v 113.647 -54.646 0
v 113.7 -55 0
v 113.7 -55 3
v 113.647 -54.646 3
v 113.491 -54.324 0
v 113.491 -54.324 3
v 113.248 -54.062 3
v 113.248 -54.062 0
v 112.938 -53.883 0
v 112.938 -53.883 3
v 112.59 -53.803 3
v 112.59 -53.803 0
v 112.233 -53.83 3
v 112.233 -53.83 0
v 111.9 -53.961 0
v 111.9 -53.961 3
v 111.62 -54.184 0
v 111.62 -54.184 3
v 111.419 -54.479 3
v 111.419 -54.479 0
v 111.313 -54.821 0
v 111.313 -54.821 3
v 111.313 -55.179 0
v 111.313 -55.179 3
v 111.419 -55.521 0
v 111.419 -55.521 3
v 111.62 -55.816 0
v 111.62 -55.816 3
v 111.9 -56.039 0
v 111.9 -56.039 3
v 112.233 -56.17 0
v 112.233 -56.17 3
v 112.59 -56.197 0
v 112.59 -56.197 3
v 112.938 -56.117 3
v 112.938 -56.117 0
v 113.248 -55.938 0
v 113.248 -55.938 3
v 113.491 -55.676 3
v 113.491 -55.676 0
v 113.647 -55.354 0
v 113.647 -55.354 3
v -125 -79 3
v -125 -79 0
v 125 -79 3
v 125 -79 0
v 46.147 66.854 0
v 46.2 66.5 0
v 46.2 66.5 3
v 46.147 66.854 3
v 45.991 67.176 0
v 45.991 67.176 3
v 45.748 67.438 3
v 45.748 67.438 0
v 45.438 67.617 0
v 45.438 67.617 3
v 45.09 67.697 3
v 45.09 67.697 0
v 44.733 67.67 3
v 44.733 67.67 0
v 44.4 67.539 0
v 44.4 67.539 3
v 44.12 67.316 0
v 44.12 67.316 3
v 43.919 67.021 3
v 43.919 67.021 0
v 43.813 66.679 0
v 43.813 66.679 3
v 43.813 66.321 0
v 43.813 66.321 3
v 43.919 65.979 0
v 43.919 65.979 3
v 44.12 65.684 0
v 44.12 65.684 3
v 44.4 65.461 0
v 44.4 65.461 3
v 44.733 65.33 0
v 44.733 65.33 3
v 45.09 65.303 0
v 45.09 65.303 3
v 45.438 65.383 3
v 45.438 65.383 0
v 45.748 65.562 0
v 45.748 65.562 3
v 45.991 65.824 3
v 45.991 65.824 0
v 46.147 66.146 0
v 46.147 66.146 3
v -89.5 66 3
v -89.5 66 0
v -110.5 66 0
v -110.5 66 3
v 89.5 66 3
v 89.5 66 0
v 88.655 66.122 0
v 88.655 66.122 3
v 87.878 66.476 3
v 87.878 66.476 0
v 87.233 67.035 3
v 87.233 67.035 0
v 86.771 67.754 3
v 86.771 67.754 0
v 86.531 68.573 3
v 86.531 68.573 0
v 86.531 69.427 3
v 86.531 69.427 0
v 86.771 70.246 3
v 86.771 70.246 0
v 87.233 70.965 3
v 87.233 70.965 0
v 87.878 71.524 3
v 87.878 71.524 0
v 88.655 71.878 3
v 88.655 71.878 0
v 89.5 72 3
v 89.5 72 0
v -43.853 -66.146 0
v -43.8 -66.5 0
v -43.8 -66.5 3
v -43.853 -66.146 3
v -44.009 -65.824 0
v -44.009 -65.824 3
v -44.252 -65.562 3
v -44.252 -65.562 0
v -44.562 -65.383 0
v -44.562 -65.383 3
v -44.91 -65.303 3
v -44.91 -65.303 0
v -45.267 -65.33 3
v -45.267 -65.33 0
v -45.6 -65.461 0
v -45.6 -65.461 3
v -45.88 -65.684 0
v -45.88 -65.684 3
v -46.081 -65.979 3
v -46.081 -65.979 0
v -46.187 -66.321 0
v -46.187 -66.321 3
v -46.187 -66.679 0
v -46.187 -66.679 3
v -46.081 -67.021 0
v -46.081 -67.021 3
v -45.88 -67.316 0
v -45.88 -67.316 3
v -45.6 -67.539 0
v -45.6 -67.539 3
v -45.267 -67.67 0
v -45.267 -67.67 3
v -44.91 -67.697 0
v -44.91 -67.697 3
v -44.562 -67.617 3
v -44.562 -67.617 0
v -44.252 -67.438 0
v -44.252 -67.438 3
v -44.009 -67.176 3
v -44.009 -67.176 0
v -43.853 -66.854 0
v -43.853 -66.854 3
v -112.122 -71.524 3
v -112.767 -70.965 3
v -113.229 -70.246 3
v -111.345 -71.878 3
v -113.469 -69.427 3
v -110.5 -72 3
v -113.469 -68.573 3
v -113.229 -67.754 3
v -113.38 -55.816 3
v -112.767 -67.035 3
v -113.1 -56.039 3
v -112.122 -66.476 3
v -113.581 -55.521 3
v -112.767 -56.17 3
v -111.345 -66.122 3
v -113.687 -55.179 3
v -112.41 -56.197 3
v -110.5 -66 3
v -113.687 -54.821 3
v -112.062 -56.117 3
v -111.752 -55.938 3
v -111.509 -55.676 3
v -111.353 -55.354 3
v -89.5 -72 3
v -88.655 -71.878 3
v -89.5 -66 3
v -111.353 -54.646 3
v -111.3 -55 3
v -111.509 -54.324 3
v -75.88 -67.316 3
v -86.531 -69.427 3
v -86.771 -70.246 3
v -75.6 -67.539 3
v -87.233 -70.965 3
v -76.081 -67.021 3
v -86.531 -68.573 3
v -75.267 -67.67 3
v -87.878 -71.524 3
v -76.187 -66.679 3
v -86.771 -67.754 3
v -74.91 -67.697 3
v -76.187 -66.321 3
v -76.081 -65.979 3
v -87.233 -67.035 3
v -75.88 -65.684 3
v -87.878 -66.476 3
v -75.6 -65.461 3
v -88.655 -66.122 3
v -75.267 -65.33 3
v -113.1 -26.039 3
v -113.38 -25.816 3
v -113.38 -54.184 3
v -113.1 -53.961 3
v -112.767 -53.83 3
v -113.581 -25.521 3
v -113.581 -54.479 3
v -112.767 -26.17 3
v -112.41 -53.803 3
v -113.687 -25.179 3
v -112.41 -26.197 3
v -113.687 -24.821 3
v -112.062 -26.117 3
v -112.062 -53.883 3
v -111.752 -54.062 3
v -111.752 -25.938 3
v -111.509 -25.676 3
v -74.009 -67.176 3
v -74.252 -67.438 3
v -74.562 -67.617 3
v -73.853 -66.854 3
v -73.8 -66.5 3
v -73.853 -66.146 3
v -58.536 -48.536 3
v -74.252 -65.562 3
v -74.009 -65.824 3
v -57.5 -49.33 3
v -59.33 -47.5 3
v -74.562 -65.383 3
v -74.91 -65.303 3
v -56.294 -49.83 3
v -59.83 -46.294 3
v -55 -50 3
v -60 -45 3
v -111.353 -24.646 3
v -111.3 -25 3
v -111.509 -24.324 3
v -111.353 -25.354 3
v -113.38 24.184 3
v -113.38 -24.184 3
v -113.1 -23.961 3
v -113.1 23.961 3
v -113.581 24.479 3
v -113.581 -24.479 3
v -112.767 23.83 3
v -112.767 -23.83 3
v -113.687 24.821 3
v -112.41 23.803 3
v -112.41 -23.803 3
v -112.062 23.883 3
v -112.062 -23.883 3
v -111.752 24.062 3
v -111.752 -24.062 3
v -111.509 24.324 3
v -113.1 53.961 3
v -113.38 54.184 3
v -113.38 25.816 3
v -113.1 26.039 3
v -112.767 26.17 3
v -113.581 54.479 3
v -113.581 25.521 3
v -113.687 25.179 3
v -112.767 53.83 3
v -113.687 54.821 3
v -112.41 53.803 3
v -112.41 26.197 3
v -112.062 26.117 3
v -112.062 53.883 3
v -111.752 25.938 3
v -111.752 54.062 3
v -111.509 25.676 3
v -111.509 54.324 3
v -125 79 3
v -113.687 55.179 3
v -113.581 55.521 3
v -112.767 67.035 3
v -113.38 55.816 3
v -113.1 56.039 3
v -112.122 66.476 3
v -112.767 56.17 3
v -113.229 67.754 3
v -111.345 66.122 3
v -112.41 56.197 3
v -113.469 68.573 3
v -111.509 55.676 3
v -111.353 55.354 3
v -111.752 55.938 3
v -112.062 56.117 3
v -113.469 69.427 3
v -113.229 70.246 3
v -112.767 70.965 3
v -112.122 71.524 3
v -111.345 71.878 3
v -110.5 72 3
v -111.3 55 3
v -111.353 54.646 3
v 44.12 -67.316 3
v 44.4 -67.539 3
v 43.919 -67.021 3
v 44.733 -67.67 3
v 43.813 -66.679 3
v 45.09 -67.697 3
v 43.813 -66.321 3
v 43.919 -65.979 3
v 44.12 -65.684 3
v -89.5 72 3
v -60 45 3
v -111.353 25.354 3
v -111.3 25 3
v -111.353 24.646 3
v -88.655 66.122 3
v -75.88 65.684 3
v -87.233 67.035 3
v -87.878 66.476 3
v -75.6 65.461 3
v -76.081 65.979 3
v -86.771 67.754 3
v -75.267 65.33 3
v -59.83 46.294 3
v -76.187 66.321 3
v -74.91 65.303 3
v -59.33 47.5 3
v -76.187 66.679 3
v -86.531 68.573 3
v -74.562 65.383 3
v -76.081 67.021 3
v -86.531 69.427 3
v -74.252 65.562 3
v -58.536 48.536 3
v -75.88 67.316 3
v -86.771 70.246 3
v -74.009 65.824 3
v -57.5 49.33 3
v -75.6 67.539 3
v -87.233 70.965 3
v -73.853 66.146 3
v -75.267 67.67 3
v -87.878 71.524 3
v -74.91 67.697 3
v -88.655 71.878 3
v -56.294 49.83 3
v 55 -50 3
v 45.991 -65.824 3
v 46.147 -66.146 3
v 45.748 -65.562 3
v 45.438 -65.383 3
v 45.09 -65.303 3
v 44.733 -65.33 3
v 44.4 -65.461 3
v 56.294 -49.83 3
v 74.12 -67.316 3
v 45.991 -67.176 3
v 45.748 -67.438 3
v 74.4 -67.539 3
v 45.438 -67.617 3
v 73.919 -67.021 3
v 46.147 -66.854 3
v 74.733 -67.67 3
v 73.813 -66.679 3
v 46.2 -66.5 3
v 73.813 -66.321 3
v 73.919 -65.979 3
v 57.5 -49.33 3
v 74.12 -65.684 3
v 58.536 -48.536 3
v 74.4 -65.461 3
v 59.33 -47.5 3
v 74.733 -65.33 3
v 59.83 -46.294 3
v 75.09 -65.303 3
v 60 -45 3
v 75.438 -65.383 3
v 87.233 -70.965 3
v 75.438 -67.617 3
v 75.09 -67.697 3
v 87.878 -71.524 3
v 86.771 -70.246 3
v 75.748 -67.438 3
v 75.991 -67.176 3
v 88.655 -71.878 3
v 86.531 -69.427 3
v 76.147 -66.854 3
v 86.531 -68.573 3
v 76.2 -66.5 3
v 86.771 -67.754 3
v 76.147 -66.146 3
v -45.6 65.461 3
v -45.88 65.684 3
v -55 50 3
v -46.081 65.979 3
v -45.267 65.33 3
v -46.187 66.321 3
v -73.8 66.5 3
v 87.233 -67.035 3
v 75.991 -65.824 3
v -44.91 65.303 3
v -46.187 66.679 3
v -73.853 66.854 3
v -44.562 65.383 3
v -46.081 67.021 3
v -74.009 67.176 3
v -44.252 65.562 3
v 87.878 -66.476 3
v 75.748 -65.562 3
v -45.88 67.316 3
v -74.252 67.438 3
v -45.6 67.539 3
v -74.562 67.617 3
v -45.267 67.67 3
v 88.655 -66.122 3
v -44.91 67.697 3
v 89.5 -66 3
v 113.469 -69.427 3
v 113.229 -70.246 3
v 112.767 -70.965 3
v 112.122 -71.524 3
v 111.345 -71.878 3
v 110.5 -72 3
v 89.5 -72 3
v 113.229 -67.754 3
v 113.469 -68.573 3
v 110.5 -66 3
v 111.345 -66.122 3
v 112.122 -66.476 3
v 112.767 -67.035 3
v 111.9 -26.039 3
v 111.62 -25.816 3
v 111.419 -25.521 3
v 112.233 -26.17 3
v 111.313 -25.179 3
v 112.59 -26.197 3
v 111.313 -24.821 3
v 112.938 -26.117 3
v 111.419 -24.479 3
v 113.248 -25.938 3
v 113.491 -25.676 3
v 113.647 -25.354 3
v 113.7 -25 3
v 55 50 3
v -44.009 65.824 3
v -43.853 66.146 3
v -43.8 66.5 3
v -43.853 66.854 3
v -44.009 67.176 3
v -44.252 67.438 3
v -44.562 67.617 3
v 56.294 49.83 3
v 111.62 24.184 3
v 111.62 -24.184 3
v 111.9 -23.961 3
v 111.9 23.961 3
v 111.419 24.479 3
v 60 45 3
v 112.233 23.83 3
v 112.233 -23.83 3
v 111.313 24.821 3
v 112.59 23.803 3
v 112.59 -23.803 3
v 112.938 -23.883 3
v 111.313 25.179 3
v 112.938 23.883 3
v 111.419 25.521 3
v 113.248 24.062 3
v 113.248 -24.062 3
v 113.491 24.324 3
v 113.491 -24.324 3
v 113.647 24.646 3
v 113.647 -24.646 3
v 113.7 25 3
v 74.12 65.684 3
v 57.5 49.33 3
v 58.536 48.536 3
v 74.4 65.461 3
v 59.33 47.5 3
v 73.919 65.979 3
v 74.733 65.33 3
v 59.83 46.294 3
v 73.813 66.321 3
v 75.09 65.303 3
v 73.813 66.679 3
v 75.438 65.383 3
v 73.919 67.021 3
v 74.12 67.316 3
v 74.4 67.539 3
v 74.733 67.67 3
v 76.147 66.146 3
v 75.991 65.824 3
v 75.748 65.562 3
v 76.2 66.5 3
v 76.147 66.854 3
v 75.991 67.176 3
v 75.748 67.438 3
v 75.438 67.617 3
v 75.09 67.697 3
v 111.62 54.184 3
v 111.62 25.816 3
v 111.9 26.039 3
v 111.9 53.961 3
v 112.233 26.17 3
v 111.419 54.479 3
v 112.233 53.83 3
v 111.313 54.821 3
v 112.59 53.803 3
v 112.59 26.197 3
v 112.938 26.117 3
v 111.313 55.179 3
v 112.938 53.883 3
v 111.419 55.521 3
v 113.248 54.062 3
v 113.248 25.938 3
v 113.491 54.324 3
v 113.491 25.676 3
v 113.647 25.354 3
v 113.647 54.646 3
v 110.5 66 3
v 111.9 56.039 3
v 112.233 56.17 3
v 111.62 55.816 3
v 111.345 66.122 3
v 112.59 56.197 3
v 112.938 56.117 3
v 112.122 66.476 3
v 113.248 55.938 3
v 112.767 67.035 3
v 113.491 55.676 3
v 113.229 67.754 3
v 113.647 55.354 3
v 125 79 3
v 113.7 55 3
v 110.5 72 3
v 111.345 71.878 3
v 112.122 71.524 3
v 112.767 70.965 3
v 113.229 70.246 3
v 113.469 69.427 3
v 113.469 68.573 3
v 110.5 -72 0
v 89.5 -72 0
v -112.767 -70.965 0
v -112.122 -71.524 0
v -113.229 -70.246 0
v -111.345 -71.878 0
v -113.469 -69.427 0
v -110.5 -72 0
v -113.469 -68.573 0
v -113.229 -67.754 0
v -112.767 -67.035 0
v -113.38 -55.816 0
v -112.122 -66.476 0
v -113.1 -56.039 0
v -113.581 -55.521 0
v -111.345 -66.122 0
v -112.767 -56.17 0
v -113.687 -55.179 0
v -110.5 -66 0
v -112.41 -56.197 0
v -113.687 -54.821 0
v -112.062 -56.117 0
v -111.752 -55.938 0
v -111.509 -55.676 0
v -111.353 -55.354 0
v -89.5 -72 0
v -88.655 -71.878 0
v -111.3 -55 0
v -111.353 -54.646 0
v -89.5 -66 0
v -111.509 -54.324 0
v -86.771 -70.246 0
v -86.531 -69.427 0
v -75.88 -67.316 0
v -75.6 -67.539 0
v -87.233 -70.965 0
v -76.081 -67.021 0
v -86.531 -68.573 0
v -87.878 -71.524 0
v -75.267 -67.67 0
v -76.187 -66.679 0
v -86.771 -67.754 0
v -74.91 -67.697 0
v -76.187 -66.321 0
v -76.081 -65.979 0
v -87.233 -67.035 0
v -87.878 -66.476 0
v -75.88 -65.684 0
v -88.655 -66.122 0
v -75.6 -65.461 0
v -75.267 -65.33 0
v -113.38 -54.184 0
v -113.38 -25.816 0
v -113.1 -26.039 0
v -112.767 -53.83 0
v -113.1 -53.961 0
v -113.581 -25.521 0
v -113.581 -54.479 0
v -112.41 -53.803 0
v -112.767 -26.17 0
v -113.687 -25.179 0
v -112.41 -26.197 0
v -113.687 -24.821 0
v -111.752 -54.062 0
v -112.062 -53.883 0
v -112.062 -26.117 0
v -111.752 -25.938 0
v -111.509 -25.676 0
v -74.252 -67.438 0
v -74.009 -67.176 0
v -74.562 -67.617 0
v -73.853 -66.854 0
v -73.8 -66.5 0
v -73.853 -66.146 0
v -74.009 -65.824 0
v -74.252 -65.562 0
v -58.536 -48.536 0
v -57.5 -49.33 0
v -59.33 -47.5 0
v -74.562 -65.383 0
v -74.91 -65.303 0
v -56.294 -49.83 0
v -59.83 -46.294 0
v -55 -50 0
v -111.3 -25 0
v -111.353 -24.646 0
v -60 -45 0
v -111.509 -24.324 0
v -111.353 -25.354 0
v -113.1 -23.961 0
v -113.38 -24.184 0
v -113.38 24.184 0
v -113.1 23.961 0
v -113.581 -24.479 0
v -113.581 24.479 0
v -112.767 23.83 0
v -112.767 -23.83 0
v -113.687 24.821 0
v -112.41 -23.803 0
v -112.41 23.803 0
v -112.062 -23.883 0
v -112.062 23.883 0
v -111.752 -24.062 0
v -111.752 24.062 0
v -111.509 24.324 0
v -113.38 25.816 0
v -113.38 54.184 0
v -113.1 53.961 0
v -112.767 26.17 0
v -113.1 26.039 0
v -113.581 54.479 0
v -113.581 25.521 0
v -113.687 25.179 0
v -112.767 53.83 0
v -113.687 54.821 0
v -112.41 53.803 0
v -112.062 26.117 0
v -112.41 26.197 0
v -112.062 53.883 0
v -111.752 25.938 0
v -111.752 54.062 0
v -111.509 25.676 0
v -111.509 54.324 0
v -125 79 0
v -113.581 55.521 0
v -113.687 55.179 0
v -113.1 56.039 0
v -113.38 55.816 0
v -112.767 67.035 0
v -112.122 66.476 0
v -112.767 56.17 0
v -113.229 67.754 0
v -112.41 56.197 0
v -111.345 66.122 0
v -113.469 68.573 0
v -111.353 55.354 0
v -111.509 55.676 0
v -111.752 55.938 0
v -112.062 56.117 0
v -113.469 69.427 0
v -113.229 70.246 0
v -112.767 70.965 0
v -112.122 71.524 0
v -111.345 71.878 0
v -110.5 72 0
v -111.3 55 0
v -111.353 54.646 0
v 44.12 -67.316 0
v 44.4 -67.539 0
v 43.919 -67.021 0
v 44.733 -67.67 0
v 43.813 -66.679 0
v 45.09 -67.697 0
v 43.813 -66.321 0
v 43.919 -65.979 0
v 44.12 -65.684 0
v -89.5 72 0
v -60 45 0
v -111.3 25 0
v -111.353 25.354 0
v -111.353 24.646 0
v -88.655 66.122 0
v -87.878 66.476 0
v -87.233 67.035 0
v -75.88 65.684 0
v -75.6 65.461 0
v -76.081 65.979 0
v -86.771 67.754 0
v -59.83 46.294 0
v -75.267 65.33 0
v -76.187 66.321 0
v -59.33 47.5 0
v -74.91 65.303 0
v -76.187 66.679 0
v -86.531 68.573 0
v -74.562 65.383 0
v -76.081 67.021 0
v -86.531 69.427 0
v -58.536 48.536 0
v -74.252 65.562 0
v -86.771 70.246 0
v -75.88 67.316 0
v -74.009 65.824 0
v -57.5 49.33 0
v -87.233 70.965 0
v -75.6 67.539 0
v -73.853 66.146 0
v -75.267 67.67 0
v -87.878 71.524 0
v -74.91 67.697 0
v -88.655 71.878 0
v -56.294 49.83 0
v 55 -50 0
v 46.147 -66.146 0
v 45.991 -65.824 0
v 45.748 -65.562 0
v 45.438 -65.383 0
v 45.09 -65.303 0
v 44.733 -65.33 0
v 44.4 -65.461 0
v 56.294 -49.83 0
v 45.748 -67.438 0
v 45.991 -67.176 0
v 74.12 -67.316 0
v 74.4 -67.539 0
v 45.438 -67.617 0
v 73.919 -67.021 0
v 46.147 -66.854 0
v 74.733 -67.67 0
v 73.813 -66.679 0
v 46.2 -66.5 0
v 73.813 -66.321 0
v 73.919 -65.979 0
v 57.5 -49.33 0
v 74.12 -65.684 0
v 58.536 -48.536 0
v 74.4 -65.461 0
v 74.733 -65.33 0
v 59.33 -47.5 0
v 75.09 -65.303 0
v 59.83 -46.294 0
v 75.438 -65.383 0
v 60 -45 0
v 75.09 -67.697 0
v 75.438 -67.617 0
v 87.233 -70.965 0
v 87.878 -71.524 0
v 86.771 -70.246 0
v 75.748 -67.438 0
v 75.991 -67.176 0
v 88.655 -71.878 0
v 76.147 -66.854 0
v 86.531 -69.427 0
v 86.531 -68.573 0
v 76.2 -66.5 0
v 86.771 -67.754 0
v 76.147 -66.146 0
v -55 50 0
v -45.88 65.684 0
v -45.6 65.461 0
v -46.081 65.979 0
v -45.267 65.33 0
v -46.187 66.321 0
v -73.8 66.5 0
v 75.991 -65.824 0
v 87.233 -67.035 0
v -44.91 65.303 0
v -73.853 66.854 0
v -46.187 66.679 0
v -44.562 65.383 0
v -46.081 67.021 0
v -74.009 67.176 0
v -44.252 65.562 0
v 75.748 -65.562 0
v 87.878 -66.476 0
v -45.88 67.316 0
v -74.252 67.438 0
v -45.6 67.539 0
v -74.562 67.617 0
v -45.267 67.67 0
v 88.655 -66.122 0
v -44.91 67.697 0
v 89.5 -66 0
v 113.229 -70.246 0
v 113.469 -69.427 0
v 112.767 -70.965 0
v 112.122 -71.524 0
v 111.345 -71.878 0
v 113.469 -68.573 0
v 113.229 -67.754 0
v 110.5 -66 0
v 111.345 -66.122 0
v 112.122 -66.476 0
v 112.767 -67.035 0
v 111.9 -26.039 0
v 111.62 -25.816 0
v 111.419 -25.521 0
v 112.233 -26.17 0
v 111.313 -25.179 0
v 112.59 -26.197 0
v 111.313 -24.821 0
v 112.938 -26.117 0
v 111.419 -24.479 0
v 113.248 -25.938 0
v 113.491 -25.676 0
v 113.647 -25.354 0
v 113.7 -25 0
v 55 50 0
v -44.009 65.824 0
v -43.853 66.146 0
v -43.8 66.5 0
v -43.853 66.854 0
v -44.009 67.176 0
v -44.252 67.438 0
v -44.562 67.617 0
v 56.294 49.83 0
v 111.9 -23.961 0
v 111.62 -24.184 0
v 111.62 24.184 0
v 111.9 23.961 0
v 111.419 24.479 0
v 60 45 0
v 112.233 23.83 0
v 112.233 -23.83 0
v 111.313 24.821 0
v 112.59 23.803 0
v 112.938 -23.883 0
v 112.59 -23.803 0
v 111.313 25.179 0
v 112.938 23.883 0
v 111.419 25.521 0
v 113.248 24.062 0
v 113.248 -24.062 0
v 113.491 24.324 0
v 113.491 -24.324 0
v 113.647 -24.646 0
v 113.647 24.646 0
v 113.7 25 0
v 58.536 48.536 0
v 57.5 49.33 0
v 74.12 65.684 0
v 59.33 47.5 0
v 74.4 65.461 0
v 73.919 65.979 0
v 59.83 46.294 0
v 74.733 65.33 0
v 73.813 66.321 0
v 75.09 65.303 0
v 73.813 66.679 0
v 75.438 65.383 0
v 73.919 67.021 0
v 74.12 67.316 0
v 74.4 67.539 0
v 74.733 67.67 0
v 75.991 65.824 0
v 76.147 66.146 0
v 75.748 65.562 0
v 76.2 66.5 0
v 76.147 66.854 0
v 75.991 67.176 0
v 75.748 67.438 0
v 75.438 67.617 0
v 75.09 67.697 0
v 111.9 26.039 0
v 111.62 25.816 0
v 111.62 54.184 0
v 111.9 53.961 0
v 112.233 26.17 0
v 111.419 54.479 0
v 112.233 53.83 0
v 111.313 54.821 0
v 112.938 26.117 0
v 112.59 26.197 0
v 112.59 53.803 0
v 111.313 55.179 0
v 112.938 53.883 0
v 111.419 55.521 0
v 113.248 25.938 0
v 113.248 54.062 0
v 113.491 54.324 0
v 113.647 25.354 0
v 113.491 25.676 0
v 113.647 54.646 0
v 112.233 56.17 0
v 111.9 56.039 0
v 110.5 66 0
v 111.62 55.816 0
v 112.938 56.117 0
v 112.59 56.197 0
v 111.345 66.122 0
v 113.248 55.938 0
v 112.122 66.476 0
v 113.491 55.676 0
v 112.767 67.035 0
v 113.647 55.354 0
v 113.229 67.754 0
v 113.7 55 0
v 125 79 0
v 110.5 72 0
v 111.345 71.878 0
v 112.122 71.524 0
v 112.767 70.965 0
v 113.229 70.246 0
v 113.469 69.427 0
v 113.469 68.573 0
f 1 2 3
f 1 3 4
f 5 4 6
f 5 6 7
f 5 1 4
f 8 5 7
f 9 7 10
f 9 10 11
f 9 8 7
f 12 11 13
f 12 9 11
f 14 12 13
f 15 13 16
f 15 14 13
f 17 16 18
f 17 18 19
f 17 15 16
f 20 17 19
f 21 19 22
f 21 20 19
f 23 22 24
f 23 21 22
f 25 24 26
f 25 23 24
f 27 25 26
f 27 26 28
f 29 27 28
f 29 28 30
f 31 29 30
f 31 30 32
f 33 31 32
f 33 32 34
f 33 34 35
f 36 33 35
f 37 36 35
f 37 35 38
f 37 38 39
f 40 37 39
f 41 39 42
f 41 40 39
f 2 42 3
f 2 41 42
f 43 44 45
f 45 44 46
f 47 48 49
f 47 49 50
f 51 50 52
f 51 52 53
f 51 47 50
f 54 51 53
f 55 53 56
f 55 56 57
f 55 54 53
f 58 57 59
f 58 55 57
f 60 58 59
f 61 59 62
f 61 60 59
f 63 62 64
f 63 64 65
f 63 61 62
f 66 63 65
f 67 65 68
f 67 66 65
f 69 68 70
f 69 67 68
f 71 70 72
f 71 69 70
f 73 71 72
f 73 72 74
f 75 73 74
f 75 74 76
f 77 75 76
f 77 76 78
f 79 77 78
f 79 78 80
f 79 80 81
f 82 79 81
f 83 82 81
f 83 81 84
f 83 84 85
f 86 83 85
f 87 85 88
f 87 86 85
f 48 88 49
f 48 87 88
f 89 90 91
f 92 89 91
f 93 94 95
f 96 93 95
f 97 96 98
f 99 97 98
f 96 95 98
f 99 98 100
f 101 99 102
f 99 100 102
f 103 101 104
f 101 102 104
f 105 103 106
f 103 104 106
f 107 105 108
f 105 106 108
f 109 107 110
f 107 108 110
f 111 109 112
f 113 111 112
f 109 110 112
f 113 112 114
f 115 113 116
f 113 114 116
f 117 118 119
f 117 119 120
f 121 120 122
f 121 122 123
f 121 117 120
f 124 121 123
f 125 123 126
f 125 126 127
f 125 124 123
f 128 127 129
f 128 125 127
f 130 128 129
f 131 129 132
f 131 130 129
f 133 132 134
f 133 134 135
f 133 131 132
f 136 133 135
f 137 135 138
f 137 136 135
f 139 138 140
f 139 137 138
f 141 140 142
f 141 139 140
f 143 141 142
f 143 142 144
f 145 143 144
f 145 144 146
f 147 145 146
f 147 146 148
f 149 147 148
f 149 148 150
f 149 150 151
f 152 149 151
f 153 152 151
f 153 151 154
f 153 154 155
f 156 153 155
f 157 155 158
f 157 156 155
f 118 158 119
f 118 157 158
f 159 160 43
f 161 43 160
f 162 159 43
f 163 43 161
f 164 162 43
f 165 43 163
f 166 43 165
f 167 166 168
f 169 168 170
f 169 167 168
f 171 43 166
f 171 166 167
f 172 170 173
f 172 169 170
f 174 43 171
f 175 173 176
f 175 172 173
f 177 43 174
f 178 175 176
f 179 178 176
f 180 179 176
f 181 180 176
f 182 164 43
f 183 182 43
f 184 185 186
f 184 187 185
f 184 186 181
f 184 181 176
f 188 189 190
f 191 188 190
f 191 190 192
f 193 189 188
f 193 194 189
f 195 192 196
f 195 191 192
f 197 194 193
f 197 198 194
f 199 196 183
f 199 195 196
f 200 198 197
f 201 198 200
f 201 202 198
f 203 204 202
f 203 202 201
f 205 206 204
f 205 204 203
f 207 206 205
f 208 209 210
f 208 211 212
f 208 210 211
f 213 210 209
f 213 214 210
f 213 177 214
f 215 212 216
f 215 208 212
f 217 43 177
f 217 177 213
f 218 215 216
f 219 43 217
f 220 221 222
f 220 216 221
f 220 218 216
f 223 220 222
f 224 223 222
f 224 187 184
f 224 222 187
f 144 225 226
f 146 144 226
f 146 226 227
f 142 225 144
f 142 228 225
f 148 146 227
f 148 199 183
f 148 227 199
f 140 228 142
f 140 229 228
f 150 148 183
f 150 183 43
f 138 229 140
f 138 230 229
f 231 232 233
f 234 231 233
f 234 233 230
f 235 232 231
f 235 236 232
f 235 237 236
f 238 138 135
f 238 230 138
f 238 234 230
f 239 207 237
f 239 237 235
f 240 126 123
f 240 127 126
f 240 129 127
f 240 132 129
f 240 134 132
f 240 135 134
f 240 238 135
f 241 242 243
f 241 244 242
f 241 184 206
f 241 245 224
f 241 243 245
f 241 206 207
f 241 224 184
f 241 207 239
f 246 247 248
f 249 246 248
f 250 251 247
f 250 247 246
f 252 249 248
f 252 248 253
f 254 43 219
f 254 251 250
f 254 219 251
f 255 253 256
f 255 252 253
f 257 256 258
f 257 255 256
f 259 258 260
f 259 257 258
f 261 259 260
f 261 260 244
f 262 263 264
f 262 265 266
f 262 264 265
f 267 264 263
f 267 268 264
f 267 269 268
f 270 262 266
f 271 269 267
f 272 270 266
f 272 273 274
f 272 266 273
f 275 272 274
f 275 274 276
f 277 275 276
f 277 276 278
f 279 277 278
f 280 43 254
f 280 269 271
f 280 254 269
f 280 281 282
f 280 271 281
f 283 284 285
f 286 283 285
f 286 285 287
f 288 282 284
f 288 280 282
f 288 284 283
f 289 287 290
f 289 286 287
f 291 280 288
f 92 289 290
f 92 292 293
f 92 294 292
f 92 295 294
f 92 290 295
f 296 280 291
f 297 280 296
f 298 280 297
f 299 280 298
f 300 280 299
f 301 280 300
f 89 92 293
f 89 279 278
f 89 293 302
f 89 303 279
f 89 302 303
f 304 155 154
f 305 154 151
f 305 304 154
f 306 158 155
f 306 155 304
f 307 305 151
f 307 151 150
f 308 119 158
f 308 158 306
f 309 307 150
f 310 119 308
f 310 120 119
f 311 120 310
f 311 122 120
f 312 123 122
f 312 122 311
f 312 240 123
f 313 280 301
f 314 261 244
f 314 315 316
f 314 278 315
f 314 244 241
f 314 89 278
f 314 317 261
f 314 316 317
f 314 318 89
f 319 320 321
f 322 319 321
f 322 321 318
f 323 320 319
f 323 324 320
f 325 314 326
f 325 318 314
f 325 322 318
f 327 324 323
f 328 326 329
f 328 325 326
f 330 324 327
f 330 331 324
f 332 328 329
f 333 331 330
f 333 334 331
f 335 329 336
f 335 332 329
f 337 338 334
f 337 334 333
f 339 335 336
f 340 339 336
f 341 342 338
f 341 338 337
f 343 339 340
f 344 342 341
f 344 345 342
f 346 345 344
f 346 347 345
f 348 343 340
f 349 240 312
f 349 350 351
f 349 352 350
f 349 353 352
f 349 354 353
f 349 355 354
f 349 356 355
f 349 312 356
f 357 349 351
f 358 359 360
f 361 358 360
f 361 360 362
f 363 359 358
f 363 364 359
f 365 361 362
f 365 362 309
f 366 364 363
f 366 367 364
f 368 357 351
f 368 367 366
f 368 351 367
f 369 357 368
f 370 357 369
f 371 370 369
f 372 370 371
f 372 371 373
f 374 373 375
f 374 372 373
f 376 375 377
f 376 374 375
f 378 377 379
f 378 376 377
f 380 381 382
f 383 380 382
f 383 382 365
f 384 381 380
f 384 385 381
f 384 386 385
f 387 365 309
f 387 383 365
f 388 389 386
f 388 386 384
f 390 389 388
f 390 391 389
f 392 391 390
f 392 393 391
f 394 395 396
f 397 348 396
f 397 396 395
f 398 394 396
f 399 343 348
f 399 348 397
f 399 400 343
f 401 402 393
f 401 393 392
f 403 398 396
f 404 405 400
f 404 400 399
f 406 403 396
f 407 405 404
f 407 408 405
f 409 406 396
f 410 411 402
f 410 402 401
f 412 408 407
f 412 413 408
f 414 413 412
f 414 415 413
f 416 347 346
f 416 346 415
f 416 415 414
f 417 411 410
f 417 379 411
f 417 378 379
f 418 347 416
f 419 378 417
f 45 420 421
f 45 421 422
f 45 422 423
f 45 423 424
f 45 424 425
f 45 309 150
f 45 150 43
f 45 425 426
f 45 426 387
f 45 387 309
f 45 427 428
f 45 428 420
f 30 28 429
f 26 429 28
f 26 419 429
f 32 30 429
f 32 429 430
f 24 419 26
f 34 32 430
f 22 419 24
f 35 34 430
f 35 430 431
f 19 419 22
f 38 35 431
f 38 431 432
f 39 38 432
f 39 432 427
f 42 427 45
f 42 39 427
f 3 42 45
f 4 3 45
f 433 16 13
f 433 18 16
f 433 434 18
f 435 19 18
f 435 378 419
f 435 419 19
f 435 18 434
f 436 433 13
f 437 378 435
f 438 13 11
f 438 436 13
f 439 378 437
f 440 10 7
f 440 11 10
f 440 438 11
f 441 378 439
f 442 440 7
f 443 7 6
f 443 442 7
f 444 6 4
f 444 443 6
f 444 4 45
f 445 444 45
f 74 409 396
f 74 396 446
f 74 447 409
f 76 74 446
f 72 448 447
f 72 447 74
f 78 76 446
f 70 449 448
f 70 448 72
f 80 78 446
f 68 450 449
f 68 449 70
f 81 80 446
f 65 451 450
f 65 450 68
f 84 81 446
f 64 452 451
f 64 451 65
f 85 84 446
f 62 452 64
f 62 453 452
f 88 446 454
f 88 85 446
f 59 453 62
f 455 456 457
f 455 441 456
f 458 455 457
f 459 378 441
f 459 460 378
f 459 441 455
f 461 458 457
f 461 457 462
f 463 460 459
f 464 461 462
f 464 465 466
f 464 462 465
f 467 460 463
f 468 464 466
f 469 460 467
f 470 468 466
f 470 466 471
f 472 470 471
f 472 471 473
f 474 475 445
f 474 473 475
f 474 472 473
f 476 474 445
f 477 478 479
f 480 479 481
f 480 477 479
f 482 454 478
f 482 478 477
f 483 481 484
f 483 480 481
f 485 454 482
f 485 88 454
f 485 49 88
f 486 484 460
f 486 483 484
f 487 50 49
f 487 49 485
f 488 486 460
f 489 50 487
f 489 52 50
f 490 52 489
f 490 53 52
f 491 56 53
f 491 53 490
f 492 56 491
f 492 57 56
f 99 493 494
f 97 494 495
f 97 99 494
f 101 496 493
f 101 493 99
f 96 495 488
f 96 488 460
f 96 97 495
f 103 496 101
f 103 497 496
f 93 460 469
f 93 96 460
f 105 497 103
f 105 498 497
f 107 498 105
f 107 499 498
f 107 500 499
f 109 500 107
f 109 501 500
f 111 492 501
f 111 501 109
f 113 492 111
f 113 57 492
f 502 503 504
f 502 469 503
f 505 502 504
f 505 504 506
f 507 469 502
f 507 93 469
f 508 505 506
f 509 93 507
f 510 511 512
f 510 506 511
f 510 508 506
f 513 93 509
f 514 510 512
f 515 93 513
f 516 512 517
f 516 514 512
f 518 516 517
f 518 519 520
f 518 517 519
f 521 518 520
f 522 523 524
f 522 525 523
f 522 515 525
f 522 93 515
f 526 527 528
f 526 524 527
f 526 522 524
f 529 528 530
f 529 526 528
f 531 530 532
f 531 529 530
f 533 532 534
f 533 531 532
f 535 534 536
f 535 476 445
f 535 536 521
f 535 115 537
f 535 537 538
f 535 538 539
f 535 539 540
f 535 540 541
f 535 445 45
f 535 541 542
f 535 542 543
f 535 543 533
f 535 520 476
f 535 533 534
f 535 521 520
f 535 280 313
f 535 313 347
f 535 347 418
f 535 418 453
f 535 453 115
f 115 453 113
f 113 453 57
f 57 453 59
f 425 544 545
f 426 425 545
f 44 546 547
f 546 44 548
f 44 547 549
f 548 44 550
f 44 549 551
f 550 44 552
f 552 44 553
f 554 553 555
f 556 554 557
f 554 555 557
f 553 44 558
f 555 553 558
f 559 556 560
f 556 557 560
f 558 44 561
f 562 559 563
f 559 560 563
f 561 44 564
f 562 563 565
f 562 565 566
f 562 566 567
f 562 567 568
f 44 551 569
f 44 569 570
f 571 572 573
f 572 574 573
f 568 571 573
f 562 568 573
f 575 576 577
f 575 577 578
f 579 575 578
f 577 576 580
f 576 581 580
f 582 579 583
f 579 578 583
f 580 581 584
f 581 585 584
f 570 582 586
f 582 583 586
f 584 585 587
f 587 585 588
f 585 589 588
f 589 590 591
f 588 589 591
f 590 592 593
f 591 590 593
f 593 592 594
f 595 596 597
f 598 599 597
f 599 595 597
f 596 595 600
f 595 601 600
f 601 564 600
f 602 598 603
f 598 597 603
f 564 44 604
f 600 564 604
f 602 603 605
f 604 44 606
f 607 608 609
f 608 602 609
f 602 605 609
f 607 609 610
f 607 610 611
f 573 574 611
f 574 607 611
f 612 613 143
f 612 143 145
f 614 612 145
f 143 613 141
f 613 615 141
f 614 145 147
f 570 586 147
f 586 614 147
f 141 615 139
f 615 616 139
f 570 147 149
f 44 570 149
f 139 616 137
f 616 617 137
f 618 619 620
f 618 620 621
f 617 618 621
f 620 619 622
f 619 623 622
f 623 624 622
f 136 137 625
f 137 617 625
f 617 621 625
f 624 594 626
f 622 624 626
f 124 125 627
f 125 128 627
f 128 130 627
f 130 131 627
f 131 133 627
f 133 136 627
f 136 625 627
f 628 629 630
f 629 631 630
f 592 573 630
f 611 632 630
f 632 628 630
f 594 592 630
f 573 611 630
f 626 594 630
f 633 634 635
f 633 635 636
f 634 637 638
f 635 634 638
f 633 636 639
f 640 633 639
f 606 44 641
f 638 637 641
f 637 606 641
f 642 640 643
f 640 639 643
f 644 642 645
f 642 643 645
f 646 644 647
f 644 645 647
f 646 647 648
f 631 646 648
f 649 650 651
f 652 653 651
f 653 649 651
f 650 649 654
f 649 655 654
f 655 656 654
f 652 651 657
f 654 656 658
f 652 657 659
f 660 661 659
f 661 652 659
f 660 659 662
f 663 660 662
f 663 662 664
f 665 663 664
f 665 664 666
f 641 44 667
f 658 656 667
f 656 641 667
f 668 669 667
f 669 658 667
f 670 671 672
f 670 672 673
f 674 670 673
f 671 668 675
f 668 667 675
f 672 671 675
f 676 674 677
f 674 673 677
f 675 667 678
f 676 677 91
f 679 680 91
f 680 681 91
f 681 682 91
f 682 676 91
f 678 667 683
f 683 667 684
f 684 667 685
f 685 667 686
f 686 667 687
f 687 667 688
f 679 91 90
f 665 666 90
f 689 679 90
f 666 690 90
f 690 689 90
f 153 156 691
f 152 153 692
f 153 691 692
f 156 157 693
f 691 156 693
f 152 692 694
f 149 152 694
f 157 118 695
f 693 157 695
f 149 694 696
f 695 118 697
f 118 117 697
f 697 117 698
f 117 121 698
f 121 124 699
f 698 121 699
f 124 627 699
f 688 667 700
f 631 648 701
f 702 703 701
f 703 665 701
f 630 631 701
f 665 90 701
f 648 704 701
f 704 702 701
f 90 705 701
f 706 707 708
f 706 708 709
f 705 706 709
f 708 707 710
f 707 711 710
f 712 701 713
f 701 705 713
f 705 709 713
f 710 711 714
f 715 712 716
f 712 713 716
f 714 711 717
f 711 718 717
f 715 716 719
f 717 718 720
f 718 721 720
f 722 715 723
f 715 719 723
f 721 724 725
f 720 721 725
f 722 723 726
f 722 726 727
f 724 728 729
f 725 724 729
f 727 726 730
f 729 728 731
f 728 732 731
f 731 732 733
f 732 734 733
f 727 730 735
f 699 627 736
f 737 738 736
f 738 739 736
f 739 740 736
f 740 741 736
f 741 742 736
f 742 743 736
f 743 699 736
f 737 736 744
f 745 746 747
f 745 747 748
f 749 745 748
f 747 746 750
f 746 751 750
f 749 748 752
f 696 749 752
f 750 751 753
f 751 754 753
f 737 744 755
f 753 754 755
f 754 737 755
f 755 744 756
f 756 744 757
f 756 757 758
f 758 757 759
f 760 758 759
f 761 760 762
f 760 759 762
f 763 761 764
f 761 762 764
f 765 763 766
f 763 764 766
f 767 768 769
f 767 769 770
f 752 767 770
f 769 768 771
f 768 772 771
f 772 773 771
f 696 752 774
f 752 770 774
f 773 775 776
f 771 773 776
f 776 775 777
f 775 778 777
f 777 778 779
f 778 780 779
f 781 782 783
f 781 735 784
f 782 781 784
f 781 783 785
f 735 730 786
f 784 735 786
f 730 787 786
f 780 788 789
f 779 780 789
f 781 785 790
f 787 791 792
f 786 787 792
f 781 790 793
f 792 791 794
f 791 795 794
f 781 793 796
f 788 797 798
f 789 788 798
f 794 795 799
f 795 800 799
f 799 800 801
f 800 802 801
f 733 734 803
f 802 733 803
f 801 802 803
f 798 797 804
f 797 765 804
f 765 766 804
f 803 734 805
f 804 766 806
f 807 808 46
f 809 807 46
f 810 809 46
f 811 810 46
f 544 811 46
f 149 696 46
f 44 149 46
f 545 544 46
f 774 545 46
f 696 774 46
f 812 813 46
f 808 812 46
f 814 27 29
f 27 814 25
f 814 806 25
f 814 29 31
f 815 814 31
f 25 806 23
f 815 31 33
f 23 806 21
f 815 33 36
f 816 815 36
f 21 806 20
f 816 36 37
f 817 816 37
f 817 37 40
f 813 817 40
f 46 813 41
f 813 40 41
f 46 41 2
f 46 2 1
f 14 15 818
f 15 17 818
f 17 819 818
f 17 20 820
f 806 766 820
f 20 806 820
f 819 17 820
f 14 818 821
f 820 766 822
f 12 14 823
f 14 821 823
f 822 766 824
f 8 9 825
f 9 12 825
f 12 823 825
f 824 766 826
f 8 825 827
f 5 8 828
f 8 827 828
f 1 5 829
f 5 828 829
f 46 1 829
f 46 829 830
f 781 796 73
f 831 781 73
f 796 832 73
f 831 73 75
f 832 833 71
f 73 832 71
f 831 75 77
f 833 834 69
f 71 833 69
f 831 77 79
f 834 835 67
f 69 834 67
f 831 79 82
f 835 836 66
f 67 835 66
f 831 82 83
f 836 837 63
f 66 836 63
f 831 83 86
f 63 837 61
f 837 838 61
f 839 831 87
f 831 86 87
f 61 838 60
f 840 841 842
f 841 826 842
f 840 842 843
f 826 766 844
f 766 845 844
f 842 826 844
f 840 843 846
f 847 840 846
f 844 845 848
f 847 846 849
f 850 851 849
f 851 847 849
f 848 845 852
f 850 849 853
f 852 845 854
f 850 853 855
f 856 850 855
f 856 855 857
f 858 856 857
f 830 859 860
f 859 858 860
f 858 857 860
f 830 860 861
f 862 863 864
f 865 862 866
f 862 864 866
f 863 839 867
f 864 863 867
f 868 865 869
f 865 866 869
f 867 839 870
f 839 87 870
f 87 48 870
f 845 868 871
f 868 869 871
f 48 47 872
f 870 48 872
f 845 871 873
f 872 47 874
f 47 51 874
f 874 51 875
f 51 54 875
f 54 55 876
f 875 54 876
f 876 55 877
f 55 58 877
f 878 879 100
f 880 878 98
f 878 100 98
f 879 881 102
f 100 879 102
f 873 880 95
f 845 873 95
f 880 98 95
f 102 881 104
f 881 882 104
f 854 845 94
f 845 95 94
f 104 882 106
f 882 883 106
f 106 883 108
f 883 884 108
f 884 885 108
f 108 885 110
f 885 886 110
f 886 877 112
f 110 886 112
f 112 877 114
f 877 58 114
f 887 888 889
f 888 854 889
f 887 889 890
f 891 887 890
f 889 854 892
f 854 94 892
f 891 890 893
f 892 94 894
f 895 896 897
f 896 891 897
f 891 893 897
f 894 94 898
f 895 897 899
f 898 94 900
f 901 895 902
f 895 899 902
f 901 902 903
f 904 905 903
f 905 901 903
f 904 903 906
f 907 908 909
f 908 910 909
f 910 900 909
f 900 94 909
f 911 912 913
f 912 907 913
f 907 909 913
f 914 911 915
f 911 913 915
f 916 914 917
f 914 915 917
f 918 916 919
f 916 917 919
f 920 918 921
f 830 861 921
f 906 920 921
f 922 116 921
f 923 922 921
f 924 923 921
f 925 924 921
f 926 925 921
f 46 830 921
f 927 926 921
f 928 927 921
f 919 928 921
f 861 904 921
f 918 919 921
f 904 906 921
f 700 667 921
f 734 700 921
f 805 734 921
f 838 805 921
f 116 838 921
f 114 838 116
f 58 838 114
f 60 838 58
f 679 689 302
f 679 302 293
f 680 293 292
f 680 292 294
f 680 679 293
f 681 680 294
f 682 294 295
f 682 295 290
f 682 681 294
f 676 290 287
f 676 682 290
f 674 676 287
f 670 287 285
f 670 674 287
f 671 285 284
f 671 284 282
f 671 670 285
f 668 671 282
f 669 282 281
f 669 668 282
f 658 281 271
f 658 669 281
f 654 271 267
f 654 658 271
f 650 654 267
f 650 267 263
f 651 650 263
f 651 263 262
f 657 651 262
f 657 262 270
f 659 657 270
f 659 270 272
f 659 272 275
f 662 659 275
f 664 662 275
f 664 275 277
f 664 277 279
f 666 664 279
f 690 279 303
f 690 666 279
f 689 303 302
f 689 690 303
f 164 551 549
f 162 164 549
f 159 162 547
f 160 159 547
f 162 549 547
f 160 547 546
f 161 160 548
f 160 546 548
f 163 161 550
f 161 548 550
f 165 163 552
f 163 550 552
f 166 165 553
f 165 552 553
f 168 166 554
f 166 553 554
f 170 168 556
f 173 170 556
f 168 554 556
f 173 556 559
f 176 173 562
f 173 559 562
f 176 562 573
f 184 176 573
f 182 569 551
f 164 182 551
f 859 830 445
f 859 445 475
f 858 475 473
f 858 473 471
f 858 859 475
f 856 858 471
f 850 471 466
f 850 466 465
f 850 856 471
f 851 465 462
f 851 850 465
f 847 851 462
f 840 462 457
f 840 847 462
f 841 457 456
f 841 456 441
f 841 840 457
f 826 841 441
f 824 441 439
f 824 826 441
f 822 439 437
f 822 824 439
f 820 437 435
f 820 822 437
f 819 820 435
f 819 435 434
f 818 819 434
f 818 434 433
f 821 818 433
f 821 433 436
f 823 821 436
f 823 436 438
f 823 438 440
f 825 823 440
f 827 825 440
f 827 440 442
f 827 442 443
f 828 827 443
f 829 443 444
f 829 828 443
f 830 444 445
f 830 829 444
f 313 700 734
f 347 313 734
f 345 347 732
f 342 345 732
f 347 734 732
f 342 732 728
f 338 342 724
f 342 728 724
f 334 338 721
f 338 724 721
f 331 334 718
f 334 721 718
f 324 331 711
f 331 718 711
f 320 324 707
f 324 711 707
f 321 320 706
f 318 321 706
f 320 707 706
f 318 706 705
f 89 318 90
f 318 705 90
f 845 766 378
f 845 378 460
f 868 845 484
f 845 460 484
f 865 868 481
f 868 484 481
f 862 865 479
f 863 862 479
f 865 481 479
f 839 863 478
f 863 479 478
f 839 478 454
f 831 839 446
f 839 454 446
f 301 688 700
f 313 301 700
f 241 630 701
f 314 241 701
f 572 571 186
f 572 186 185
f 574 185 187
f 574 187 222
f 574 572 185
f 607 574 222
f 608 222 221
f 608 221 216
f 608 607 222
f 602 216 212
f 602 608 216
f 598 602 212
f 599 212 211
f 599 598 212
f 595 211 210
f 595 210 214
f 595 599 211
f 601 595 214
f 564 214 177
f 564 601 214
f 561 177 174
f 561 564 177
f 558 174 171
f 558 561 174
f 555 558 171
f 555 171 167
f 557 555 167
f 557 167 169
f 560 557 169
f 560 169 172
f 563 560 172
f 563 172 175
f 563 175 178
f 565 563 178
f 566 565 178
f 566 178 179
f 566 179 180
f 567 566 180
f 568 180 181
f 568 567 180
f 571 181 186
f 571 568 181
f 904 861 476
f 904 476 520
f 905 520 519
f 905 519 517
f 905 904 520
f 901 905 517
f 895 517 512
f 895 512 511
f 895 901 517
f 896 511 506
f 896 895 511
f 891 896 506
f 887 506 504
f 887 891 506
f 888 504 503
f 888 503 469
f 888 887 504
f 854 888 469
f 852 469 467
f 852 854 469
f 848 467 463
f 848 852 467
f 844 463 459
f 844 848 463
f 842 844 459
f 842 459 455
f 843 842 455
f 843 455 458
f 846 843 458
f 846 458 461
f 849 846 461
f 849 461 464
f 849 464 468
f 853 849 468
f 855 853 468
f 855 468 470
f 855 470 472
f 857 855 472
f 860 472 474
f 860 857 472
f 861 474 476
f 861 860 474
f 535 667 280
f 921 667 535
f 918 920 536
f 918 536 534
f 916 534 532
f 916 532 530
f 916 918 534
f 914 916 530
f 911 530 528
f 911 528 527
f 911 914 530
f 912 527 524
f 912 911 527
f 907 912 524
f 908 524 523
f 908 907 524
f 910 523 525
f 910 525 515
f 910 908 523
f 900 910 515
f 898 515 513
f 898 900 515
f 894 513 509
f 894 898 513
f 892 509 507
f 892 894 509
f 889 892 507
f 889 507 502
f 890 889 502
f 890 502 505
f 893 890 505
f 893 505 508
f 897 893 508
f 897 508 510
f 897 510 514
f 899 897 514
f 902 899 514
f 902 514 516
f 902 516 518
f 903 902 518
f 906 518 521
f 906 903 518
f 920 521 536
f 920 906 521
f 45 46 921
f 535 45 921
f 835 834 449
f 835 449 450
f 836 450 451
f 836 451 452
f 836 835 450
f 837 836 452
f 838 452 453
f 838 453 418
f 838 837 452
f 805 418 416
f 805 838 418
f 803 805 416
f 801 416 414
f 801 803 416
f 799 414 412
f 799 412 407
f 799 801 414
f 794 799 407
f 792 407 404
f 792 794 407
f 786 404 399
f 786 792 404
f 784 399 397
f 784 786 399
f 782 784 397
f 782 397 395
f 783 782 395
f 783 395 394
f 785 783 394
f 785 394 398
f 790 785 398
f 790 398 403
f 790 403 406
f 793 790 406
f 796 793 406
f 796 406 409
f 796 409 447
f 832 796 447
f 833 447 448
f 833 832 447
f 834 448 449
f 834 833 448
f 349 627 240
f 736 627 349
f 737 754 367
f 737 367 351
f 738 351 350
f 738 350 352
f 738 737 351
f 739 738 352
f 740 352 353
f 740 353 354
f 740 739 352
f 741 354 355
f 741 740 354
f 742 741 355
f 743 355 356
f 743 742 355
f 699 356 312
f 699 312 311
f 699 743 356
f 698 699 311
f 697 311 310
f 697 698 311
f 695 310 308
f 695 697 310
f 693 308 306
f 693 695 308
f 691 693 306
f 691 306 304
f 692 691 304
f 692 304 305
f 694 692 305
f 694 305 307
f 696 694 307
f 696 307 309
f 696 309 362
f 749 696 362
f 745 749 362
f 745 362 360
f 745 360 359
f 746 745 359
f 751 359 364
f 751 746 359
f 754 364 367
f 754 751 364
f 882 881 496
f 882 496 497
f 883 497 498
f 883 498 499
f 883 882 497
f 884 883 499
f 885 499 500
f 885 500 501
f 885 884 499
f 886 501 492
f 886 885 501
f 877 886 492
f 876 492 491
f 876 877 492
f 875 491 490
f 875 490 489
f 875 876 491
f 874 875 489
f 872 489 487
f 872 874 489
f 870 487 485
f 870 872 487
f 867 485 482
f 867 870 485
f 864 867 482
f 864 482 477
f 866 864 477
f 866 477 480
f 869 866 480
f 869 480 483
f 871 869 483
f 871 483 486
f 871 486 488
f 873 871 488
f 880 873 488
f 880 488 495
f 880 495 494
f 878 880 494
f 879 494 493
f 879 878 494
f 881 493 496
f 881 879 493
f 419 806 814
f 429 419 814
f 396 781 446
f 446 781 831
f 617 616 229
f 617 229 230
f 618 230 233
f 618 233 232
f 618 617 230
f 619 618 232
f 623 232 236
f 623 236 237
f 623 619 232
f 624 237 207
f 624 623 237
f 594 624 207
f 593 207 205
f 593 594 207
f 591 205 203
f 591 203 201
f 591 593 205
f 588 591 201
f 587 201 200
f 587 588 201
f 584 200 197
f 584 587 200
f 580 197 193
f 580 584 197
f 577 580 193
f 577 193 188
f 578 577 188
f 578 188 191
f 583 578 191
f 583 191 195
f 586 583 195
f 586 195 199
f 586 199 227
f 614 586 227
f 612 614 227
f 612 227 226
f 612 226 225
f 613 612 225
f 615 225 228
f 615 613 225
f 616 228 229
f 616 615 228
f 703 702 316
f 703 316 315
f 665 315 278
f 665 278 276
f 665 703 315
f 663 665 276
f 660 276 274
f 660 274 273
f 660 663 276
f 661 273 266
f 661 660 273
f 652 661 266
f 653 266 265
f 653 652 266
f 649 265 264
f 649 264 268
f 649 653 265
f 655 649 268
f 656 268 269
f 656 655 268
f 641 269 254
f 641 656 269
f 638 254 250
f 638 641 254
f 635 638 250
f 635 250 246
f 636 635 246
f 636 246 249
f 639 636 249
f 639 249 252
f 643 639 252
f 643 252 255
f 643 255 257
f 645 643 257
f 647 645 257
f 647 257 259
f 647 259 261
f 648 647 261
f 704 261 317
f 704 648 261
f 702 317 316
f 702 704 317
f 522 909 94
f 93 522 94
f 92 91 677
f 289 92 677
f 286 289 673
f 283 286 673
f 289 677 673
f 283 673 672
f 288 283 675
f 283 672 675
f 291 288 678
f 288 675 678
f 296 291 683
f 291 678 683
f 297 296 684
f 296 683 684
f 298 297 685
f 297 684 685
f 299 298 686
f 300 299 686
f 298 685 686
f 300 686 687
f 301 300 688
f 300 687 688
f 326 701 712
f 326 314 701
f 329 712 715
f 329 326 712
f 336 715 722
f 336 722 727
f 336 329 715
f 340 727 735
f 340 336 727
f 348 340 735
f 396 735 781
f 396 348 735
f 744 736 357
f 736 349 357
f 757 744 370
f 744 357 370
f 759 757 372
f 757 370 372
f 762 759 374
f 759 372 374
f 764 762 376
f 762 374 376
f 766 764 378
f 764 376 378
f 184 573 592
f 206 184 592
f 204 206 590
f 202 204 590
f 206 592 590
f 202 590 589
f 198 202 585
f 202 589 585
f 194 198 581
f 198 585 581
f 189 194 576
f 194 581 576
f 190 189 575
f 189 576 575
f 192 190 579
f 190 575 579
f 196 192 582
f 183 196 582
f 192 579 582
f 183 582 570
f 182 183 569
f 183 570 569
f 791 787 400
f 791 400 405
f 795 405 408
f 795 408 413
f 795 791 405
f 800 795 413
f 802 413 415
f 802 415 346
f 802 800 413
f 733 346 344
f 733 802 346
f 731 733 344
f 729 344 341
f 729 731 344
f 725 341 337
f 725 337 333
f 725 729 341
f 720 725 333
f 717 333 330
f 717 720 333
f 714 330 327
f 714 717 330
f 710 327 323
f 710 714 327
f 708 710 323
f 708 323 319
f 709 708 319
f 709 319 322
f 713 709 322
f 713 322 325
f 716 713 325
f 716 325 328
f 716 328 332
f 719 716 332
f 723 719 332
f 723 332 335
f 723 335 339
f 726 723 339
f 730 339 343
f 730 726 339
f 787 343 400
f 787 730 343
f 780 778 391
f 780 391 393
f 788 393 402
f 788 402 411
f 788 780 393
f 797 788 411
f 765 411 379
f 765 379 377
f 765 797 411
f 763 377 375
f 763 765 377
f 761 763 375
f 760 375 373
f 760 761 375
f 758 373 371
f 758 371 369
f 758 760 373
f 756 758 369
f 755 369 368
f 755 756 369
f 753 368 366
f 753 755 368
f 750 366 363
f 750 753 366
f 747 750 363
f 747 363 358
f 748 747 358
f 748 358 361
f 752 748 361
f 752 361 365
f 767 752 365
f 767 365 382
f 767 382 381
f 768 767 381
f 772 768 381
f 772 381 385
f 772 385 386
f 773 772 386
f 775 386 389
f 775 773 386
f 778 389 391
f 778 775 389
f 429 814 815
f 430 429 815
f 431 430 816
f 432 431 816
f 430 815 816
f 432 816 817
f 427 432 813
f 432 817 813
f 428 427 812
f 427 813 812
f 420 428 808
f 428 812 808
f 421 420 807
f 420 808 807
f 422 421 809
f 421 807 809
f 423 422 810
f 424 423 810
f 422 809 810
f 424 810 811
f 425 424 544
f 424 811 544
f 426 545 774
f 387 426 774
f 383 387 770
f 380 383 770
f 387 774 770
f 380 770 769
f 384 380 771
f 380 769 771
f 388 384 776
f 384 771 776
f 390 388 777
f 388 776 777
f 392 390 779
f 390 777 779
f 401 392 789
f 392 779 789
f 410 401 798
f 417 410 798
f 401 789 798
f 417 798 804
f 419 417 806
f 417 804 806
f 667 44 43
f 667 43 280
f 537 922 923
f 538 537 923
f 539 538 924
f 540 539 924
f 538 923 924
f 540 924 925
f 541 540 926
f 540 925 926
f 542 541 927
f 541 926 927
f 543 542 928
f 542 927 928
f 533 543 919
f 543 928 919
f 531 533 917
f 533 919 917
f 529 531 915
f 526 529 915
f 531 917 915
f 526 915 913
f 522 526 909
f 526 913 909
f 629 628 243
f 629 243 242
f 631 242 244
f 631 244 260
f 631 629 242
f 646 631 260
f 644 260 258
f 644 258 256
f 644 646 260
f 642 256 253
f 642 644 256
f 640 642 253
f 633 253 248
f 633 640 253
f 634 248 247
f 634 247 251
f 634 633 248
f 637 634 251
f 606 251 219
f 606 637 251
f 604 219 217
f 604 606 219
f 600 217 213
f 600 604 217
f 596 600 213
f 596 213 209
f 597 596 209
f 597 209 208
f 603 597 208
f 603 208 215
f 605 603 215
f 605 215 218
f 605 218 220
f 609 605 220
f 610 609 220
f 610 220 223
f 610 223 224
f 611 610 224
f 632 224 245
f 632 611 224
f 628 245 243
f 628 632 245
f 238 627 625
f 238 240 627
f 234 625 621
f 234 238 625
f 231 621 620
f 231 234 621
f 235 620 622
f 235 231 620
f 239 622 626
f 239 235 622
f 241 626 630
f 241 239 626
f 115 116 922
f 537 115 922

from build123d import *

# Parameters (mm, degrees)
F0_W     = 250
F0_H     = 158
F0_R     = 1.2
F0_W_2   = 120
F0_H_2   = 100
F1_DEPTH = 3
F2_R     = 5


with BuildPart() as f1:
    # F0 (on Top) → F1 (new body)
    with BuildSketch(Plane.XY):
        Rectangle(F0_W, F0_H)
        with BuildLine():
            ThreePointArc((-89.5, -66), (-86.5, -69), (-89.5, -72))
            Line((-89.5, -72), (-110.5, -72))
            ThreePointArc((-110.5, -72), (-113.5, -69), (-110.5, -66))
            Line((-110.5, -66), (-89.5, -66))
        make_face(mode=Mode.SUBTRACT)
        with Locations((-75, -66.5)):
            Circle(F0_R, mode=Mode.SUBTRACT)
        with Locations((-112.5, -55)):
            Circle(F0_R, mode=Mode.SUBTRACT)
        with Locations((-45, -66.5)):
            Circle(F0_R, mode=Mode.SUBTRACT)
        with Locations((-112.5, -25)):
            Circle(F0_R, mode=Mode.SUBTRACT)
        with Locations((45, -66.5)):
            Circle(F0_R, mode=Mode.SUBTRACT)
        with Locations((75, -66.5)):
            Circle(F0_R, mode=Mode.SUBTRACT)
        with BuildLine():
            ThreePointArc((89.5, -72), (86.5, -69), (89.5, -66))
            Line((89.5, -66), (110.5, -66))
            ThreePointArc((110.5, -66), (113.5, -69), (110.5, -72))
            Line((110.5, -72), (89.5, -72))
        make_face(mode=Mode.SUBTRACT)
        with Locations((112.5, -55)):
            Circle(F0_R, mode=Mode.SUBTRACT)
        with Locations((112.5, -25)):
            Circle(F0_R, mode=Mode.SUBTRACT)
        with Locations((-112.5, 25)):
            Circle(F0_R, mode=Mode.SUBTRACT)
        with Locations((-112.5, 55)):
            Circle(F0_R, mode=Mode.SUBTRACT)
        with BuildLine():
            ThreePointArc((-89.5, 72), (-86.5, 69), (-89.5, 66))
            Line((-89.5, 66), (-110.5, 66))
            ThreePointArc((-110.5, 66), (-113.5, 69), (-110.5, 72))
            Line((-110.5, 72), (-89.5, 72))
        make_face(mode=Mode.SUBTRACT)
        with Locations((-75, 66.5)):
            Circle(F0_R, mode=Mode.SUBTRACT)
        with Locations((-45, 66.5)):
            Circle(F0_R, mode=Mode.SUBTRACT)
        Rectangle(F0_W_2, F0_H_2, mode=Mode.SUBTRACT)
        with Locations((112.5, 25)):
            Circle(F0_R, mode=Mode.SUBTRACT)
        with Locations((45, 66.5)):
            Circle(F0_R, mode=Mode.SUBTRACT)
        with Locations((112.5, 55)):
            Circle(F0_R, mode=Mode.SUBTRACT)
        with Locations((75, 66.5)):
            Circle(F0_R, mode=Mode.SUBTRACT)
        with BuildLine():
            ThreePointArc((110.5, 72), (113.5, 69), (110.5, 66))
            Line((110.5, 66), (89.5, 66))
            ThreePointArc((89.5, 66), (86.5, 69), (89.5, 72))
            Line((89.5, 72), (110.5, 72))
        make_face(mode=Mode.SUBTRACT)
    extrude(amount=F1_DEPTH)

    # F2
    f2_edges = [f1.edges().sort_by_distance(p)[0] for p in [
        (-60, 50, 1.5),
        (-60, -50, 1.5),
        (60, -50, 1.5),
        (60, 50, 1.5),
    ]]
    fillet(f2_edges, radius=F2_R)


solid = f1.part
